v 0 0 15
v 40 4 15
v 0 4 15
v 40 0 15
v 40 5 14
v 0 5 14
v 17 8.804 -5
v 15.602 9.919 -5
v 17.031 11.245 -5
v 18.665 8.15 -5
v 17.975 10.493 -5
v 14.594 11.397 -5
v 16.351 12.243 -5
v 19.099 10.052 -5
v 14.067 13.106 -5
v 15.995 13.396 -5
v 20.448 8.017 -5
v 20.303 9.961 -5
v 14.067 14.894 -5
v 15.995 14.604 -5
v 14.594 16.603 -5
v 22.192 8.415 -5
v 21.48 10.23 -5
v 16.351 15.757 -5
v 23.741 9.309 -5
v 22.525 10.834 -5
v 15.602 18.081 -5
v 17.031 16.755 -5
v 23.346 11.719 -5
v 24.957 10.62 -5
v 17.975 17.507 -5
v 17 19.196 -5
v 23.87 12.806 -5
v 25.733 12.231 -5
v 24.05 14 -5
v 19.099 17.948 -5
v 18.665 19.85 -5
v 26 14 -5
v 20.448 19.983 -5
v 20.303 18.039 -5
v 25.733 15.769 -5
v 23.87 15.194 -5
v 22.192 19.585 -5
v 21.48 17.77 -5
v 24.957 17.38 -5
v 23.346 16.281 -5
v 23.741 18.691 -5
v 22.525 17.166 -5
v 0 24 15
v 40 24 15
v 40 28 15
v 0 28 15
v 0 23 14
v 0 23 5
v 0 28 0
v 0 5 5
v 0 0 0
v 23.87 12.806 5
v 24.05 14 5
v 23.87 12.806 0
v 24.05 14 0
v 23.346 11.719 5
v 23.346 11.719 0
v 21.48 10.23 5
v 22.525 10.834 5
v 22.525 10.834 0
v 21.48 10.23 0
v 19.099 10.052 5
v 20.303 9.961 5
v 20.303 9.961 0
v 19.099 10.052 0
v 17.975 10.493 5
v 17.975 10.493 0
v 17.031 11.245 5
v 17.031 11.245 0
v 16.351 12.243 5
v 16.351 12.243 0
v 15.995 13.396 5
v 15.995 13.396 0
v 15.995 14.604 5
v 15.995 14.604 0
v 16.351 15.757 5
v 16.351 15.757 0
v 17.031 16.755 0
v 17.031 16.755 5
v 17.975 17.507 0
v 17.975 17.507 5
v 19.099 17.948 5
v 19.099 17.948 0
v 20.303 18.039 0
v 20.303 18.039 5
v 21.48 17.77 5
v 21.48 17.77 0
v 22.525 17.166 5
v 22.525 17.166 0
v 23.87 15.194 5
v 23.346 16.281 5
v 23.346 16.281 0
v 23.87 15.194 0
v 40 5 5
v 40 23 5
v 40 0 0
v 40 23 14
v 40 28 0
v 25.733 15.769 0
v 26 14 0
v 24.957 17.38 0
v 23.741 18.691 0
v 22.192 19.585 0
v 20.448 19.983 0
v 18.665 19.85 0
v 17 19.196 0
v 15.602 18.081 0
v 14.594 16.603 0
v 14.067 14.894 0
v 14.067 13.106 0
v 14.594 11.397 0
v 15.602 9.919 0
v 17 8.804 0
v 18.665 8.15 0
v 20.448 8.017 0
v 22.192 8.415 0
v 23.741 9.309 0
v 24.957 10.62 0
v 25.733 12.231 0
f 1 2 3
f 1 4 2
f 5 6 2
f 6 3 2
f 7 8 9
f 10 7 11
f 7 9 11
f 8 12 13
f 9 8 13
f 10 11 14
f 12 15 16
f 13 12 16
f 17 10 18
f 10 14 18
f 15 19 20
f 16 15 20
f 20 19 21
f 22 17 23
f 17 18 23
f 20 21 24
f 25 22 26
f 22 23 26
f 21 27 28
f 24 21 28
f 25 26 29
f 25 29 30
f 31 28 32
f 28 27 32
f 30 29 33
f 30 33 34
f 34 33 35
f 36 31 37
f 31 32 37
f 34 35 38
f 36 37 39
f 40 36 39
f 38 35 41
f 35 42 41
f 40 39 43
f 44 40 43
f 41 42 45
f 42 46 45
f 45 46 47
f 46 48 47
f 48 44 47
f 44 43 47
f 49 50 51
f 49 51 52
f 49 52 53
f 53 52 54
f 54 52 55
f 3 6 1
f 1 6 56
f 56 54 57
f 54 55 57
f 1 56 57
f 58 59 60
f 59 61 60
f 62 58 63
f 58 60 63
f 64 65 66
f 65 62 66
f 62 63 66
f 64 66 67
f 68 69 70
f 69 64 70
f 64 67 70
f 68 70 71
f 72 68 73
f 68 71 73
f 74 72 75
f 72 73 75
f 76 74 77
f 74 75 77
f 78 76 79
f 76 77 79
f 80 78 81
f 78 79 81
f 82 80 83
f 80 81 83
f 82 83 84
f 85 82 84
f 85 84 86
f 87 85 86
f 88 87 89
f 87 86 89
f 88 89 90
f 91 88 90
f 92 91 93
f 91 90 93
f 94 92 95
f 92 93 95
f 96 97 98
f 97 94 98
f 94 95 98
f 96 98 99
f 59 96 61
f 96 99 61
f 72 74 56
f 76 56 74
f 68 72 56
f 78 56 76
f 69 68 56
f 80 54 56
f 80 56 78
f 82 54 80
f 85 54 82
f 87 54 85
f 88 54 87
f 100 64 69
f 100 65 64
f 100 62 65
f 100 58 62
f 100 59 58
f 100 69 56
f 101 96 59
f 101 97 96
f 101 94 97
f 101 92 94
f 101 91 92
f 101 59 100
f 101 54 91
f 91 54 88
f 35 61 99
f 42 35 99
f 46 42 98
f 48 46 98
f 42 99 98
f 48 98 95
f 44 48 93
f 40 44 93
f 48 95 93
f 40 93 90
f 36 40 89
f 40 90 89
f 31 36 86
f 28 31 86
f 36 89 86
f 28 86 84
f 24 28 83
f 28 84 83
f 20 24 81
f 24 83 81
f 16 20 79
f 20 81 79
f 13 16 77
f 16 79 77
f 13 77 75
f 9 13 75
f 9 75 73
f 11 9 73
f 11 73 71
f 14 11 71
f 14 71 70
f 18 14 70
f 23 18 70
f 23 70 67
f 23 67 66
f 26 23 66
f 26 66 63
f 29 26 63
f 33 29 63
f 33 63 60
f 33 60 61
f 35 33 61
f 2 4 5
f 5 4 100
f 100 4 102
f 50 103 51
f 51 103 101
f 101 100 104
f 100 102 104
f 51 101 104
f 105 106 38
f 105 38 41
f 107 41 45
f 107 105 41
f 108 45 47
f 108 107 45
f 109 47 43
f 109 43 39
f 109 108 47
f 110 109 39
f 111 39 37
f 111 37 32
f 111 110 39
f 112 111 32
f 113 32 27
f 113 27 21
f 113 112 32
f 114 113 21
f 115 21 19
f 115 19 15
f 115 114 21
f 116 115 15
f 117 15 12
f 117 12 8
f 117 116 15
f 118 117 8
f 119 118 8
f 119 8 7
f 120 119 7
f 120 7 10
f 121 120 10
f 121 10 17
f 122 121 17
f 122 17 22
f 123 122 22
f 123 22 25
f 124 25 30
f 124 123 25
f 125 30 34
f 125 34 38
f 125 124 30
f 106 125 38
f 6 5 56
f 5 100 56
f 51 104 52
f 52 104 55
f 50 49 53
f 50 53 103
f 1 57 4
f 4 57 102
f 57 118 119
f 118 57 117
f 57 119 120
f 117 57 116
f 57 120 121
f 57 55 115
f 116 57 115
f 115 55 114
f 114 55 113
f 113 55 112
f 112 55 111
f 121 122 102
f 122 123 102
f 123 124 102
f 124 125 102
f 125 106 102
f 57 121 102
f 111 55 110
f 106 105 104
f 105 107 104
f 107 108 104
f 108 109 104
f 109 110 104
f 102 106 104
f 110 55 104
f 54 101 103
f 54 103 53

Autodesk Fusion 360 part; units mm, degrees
sketch "Sketch1" plane through (0, 0, 0) normal (0, 0, 1) x (1, 0, 0)
  line L0 (0, 0) -> (40, 0)
  line L1 (40, 0) -> (40, 28)
  line L2 (40, 28) -> (0, 28)
  line L3 (0, 28) -> (0, 0)
  circle A0 centre (20, 14) radius 4.05
  dimension "d1" = 40
  dimension "d2" = 28
  dimension "d3" = 8.1
  dimension "d10" = 14
  dimension "d11" = 20
extrude "Extrude1" add sketch "Sketch1" along normal blind 5
sketch "Sketch2" plane through (0, 0, 5) normal (0, 0, 1) x (-1, 0, 0)
  circle A0 centre (-20, -14) radius 4.05
  line L0 (0, -28) -> (0, 0)
  line L1 (0, 0) -> (-40, 0)
  line L2 (-40, 0) -> (-40, -28)
  line L3 (-40, -28) -> (0, -28)
  line L4 (0, -28) -> (-40, -28)
  line L5 (-40, -28) -> (-40, -23)
  line L6 (-40, -23) -> (0, -23)
  line L7 (0, -23) -> (0, -28)
  line L8 (0, 0) -> (-40, 0)
  line L9 (-40, 0) -> (-40, -5)
  line L10 (-40, -5) -> (0, -5)
  line L11 (0, -5) -> (0, 0)
  dimension "d6" = 40
  dimension "d7" = 5
  dimension "d8" = 40
  dimension "d9" = 5
extrude "Extrude2" add sketch "Sketch2" along normal blind 10 contours L0 L2 L3 L4 L5 L6 L7 | L0 L1 L2 L8 L9 L10 L11
chamfer "Chamfer1" distance 1 angle 45 2 edges at (20, 23, 15) (20, 5, 15)
sketch "Sketch3" plane through (0, 0, 0) normal (0, 0, 1) x (1, 0, 0)
  circle A0 centre (20, 14) radius 6
  circle A1 centre (20, 14) radius 4.05
  dimension "d15" = 12
extrude "Extrude3" add sketch "Sketch3" against normal blind 5
